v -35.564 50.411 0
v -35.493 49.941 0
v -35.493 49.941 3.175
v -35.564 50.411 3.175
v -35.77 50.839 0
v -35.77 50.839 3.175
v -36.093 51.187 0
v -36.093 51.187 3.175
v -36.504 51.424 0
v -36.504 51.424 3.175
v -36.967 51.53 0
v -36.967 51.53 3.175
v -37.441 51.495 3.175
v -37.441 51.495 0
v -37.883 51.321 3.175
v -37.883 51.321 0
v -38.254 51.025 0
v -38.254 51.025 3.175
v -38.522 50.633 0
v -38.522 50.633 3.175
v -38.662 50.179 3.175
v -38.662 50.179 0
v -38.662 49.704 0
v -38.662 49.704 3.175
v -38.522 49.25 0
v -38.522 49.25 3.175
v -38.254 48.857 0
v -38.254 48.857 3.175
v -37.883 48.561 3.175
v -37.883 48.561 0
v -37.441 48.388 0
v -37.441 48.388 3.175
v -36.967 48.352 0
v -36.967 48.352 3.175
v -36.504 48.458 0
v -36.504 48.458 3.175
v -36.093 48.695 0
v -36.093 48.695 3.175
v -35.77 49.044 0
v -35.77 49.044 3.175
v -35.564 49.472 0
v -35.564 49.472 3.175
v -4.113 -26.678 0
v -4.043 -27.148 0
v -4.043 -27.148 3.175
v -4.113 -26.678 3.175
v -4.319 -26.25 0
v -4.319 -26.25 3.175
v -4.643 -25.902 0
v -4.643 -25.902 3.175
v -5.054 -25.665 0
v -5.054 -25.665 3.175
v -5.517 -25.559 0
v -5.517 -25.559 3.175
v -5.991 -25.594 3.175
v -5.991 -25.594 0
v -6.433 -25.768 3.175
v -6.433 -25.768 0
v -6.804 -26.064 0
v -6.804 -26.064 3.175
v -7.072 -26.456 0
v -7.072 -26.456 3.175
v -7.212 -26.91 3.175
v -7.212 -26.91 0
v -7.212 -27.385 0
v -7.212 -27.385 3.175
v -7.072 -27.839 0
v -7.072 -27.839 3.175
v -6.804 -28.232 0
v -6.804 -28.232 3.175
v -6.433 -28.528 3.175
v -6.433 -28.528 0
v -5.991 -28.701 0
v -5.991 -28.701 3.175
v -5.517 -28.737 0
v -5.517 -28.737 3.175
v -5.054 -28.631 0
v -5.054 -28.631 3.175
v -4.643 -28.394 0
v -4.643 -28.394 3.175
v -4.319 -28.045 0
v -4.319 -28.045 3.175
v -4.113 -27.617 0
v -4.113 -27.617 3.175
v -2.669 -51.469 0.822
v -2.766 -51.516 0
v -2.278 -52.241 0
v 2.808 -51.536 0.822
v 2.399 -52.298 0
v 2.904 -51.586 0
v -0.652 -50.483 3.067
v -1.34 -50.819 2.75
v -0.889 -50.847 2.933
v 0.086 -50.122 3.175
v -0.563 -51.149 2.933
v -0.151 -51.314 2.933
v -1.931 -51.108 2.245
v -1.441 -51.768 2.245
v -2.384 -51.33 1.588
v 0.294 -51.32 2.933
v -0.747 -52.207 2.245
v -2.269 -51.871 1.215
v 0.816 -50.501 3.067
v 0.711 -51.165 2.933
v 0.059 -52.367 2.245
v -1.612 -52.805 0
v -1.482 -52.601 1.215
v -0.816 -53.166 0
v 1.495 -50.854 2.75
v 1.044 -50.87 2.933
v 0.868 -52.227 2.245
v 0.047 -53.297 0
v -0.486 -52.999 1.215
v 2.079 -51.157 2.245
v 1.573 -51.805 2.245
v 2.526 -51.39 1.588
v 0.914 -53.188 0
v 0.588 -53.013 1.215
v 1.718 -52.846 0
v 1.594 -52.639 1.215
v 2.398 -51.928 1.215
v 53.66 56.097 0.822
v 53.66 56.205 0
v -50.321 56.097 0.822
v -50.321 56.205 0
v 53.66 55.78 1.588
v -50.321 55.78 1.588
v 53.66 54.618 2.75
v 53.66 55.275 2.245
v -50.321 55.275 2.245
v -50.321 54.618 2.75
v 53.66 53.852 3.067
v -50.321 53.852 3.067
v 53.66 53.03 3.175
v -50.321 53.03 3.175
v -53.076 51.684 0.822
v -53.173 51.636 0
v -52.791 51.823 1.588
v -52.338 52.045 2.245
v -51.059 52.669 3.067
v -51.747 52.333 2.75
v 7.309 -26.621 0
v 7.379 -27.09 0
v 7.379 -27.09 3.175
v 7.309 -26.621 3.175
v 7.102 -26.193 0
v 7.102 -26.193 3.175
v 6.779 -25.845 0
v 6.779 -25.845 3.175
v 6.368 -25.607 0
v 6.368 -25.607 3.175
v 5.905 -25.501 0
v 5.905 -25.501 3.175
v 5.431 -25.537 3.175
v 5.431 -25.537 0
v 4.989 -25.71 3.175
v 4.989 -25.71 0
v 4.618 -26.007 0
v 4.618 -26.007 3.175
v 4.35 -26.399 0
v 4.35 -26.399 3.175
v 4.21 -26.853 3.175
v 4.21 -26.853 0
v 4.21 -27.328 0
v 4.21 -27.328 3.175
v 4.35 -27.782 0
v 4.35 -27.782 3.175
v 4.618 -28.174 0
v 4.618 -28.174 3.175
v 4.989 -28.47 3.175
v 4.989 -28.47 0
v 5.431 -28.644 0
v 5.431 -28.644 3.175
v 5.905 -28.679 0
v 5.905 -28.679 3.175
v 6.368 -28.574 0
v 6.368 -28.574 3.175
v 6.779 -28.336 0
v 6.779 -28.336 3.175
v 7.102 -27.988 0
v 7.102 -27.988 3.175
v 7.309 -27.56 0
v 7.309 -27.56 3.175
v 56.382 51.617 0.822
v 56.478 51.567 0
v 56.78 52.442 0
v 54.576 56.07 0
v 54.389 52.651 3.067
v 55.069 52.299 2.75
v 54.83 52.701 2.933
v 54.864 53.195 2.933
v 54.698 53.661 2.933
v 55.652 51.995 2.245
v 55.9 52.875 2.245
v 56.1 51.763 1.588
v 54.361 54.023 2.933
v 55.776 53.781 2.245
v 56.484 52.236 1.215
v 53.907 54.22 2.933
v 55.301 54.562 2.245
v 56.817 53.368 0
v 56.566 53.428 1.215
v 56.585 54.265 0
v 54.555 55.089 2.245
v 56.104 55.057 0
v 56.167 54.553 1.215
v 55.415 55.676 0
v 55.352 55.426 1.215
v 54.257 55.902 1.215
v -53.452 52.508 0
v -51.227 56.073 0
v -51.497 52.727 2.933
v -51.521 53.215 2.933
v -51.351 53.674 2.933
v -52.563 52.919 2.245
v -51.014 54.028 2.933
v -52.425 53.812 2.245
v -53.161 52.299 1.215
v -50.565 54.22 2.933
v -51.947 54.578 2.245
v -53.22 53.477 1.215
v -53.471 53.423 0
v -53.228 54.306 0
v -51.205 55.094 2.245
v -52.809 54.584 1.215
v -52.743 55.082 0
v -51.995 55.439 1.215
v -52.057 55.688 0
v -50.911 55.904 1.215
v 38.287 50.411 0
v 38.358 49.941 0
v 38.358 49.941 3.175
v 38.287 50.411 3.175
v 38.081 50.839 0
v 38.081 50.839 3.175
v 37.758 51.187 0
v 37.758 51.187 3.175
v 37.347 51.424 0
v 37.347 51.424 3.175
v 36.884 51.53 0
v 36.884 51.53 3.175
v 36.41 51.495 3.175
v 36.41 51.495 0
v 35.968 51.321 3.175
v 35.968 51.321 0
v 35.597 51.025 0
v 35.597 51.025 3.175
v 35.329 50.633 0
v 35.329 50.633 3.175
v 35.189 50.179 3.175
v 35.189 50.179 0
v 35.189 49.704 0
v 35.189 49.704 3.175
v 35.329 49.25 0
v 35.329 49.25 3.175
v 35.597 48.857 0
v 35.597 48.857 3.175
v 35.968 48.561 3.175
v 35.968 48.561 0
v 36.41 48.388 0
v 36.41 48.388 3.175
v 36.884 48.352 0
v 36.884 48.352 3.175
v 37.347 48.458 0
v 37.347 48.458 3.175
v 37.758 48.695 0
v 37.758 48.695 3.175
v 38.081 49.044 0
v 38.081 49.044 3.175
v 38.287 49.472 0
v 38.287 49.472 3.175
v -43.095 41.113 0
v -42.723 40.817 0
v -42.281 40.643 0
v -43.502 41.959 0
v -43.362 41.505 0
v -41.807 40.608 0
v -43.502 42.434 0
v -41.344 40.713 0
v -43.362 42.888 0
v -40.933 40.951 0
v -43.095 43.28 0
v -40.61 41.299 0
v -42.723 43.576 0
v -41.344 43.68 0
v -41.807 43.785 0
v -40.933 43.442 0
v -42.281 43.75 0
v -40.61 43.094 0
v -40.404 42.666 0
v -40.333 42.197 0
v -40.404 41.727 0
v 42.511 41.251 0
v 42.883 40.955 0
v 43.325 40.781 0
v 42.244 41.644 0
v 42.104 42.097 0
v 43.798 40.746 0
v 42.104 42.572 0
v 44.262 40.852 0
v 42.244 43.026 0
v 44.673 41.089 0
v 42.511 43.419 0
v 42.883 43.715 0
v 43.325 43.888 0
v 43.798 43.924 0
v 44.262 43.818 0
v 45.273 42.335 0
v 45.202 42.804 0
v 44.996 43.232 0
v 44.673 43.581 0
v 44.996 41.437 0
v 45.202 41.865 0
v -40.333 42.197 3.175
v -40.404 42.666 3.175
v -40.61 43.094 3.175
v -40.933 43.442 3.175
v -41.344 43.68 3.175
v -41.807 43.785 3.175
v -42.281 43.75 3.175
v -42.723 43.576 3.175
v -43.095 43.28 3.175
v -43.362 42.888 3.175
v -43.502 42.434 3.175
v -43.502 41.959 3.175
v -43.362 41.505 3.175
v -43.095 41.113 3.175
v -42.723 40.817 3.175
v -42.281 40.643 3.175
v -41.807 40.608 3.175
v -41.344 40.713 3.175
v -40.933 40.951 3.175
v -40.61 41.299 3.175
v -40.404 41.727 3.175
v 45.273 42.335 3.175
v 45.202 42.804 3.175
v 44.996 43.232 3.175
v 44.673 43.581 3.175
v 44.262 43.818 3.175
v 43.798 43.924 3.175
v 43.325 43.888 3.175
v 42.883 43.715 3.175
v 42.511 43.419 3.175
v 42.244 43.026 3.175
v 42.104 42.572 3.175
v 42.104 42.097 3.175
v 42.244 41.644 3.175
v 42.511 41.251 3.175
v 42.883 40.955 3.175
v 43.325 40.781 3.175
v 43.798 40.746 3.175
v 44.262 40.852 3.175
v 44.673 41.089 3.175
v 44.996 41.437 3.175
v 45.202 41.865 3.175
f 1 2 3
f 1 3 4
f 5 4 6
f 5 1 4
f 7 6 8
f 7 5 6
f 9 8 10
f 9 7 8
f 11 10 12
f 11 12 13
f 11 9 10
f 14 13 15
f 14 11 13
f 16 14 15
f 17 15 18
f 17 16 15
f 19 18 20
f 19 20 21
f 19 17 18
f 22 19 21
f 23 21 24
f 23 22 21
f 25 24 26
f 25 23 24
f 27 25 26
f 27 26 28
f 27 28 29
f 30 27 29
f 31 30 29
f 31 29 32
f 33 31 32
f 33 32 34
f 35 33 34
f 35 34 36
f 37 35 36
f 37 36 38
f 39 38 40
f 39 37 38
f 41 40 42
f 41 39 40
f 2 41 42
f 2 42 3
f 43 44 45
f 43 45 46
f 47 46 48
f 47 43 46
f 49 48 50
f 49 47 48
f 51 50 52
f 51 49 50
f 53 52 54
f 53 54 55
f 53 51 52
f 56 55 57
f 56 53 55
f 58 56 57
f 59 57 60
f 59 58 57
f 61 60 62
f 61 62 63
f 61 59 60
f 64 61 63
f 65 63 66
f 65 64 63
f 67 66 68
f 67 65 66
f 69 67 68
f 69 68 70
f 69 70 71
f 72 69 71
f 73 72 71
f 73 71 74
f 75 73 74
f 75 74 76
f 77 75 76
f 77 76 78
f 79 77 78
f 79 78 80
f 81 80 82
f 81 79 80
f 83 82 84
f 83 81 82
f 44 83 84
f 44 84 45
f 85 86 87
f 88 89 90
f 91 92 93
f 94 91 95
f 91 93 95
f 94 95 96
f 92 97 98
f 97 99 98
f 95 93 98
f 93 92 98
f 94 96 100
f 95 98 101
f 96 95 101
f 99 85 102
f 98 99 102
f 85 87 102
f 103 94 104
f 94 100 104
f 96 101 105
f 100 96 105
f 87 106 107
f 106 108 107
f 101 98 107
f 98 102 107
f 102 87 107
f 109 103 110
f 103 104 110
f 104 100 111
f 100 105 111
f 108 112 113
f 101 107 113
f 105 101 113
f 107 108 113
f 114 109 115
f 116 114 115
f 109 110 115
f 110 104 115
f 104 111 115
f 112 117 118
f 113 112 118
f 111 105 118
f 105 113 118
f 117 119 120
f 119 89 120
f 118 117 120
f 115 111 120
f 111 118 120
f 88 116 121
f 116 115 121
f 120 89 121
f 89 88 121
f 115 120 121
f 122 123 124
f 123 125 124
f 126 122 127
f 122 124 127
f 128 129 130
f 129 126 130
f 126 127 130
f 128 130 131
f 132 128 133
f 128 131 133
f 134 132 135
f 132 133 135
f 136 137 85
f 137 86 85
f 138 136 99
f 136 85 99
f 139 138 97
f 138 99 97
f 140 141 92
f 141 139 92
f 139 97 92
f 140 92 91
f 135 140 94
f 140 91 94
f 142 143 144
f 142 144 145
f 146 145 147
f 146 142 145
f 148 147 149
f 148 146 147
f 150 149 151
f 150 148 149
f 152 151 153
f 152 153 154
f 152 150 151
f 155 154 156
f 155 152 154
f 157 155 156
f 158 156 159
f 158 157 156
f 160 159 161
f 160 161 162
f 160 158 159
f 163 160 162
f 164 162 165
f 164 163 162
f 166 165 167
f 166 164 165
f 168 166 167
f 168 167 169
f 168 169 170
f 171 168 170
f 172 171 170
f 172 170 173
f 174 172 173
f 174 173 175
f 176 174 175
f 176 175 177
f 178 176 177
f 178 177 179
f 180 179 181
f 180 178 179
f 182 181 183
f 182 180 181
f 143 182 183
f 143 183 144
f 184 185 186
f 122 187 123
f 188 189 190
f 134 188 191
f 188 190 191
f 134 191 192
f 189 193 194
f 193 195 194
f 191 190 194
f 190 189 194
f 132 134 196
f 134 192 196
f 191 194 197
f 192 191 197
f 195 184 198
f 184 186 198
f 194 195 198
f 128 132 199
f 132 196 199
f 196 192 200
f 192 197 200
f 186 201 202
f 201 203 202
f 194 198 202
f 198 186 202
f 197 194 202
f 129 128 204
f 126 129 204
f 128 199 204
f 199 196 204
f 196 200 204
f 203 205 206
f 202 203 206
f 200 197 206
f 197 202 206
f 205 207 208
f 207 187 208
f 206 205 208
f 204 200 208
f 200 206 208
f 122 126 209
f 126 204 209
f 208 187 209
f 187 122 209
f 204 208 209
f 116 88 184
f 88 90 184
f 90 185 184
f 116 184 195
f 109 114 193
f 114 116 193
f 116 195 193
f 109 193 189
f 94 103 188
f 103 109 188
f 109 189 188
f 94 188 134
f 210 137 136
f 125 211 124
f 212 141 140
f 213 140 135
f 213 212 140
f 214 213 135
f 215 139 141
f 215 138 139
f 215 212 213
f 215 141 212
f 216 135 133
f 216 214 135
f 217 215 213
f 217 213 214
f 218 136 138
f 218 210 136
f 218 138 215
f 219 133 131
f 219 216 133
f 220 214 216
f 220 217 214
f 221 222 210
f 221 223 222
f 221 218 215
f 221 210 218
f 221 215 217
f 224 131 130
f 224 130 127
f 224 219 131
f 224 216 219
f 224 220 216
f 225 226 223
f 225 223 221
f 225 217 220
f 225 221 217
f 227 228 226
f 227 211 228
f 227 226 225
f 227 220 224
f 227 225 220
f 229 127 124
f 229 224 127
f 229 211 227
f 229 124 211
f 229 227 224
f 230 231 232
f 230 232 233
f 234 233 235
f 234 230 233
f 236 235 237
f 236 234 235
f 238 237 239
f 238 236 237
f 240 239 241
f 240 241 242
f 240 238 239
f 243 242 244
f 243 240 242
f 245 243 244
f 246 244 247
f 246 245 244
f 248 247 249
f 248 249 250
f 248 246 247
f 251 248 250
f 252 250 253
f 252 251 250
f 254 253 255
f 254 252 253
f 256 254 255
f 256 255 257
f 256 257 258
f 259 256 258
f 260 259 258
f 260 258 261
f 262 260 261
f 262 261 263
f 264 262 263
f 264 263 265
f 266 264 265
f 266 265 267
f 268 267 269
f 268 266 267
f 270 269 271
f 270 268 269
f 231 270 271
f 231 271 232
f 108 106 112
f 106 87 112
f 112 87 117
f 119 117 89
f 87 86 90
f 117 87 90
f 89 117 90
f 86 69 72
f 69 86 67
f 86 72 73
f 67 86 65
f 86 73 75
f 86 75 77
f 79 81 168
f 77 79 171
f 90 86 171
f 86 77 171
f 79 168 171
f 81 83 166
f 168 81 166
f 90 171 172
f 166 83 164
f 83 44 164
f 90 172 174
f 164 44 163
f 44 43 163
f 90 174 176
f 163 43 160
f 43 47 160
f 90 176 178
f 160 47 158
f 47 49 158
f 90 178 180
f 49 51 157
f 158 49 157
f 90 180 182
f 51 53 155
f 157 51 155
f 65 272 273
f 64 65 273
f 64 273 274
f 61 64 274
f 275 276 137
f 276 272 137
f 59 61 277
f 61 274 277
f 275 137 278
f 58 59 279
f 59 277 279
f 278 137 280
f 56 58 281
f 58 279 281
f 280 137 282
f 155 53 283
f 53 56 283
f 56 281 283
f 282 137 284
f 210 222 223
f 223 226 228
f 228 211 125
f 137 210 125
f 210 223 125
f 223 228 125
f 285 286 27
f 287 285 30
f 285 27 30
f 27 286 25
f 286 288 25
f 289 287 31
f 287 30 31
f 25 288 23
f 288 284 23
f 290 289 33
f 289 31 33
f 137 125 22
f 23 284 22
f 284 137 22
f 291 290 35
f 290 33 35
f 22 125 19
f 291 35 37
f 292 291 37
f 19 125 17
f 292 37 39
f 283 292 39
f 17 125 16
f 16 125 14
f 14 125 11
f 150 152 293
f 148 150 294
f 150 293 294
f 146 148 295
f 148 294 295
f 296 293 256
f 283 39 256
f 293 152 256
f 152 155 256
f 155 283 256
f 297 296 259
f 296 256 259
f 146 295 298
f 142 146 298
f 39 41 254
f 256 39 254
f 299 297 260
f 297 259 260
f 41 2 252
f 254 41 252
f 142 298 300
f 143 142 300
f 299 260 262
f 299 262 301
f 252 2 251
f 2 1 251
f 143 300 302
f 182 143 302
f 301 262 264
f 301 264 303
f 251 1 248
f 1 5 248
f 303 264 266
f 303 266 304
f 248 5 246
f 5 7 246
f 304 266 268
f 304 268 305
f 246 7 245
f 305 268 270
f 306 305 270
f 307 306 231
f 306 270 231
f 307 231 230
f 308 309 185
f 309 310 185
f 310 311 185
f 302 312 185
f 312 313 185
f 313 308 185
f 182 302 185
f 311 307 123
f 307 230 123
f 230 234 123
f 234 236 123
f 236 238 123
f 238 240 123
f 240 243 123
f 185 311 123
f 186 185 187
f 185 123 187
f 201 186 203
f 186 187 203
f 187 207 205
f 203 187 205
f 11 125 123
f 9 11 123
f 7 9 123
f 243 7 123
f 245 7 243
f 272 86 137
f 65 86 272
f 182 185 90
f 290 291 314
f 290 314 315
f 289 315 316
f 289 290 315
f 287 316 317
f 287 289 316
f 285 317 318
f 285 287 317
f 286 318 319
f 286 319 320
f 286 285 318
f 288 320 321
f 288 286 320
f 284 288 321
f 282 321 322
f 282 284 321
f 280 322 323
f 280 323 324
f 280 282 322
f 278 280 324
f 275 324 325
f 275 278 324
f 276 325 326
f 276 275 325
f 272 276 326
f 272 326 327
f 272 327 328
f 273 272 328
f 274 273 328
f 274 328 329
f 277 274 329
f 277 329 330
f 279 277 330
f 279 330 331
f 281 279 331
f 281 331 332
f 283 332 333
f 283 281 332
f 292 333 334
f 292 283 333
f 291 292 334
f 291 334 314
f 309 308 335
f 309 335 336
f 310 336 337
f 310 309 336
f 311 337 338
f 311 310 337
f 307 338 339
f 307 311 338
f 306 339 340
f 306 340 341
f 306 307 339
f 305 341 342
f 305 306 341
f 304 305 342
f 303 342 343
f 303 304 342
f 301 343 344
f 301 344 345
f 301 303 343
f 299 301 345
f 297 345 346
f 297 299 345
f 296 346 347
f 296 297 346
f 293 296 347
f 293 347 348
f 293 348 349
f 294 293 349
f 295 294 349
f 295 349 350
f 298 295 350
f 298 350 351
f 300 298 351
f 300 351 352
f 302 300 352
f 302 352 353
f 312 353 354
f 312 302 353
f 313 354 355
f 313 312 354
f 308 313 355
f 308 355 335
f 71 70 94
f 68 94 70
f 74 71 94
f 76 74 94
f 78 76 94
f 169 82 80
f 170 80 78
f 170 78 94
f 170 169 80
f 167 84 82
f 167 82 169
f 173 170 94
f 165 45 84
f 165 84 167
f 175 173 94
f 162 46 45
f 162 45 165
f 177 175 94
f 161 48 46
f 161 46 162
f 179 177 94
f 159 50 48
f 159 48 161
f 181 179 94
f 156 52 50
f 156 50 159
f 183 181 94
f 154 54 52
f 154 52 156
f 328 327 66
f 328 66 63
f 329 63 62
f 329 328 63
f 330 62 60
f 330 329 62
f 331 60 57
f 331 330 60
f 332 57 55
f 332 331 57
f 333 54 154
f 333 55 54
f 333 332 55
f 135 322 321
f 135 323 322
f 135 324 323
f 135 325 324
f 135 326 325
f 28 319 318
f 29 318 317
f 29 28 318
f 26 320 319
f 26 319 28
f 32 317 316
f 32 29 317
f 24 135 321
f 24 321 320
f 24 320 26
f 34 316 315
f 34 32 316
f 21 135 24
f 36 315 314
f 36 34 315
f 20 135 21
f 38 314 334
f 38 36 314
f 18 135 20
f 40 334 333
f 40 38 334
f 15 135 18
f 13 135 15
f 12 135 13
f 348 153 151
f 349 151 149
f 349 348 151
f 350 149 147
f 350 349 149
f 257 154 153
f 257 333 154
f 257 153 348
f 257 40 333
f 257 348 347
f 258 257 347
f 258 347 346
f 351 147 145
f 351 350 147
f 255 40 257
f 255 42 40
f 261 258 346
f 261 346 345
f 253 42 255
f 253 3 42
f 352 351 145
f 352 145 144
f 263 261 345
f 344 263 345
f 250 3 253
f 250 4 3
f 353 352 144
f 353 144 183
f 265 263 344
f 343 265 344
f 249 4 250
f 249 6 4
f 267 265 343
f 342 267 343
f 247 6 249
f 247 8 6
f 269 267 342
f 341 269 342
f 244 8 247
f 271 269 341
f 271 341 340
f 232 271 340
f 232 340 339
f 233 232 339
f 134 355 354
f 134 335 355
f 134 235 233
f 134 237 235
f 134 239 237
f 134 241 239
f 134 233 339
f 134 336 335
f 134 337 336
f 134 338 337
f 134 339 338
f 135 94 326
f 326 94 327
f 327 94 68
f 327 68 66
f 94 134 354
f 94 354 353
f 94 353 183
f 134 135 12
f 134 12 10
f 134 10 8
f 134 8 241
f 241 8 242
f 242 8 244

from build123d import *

# Parameters (mm, degrees)
F0_R     = 1.5933630383
F1_DEPTH = 3.175
F2_R     = 3.17499


# Not quite as in the source:
# - a fillet or chamfer is up to 0.001 mm smaller than in the source, because OpenCascade refuses the exact size


with BuildPart() as f1:
    # F0 (on Top) → F1 (new body)
    with BuildSketch(Plane.XY):
        Polygon((58.8864982128, 56.2052130699), (-55.4059632123, 56.2052130699), (0, -57.1772865951), align=None)
        with Locations((-5.6359637529, -27.1478164941)):
            Circle(F0_R, mode=Mode.SUBTRACT)
        with Locations((5.7859569788, -27.0903464407)):
            Circle(F0_R, mode=Mode.SUBTRACT)
        with Locations((-41.9265702367, 42.1965457499)):
            Circle(F0_R, mode=Mode.SUBTRACT)
        with Locations((-37.0861701667, 49.9411858618)):
            Circle(F0_R, mode=Mode.SUBTRACT)
        with Locations((43.6793863773, 42.3348434269)):
            Circle(F0_R, mode=Mode.SUBTRACT)
        with Locations((36.7645248771, 49.9411858618)):
            Circle(F0_R, mode=Mode.SUBTRACT)
    extrude(amount=F1_DEPTH)

    # F2 (radius 3.175 in the source; OpenCascade refuses exactly that, so slightly less here)
    f2_edges = [f1.edges().sort_by_distance(p)[0] for p in [
        (-27.702982, -0.486037, 3.175),
        (29.443249, -0.486037, 3.175),
        (1.740268, 56.205213, 3.175),
        (0, -57.177287, 1.5875),
        (-55.405963, 56.205213, 1.5875),
        (58.886498, 56.205213, 1.5875),
    ]]
    fillet(f2_edges, radius=F2_R)


solid = f1.part
